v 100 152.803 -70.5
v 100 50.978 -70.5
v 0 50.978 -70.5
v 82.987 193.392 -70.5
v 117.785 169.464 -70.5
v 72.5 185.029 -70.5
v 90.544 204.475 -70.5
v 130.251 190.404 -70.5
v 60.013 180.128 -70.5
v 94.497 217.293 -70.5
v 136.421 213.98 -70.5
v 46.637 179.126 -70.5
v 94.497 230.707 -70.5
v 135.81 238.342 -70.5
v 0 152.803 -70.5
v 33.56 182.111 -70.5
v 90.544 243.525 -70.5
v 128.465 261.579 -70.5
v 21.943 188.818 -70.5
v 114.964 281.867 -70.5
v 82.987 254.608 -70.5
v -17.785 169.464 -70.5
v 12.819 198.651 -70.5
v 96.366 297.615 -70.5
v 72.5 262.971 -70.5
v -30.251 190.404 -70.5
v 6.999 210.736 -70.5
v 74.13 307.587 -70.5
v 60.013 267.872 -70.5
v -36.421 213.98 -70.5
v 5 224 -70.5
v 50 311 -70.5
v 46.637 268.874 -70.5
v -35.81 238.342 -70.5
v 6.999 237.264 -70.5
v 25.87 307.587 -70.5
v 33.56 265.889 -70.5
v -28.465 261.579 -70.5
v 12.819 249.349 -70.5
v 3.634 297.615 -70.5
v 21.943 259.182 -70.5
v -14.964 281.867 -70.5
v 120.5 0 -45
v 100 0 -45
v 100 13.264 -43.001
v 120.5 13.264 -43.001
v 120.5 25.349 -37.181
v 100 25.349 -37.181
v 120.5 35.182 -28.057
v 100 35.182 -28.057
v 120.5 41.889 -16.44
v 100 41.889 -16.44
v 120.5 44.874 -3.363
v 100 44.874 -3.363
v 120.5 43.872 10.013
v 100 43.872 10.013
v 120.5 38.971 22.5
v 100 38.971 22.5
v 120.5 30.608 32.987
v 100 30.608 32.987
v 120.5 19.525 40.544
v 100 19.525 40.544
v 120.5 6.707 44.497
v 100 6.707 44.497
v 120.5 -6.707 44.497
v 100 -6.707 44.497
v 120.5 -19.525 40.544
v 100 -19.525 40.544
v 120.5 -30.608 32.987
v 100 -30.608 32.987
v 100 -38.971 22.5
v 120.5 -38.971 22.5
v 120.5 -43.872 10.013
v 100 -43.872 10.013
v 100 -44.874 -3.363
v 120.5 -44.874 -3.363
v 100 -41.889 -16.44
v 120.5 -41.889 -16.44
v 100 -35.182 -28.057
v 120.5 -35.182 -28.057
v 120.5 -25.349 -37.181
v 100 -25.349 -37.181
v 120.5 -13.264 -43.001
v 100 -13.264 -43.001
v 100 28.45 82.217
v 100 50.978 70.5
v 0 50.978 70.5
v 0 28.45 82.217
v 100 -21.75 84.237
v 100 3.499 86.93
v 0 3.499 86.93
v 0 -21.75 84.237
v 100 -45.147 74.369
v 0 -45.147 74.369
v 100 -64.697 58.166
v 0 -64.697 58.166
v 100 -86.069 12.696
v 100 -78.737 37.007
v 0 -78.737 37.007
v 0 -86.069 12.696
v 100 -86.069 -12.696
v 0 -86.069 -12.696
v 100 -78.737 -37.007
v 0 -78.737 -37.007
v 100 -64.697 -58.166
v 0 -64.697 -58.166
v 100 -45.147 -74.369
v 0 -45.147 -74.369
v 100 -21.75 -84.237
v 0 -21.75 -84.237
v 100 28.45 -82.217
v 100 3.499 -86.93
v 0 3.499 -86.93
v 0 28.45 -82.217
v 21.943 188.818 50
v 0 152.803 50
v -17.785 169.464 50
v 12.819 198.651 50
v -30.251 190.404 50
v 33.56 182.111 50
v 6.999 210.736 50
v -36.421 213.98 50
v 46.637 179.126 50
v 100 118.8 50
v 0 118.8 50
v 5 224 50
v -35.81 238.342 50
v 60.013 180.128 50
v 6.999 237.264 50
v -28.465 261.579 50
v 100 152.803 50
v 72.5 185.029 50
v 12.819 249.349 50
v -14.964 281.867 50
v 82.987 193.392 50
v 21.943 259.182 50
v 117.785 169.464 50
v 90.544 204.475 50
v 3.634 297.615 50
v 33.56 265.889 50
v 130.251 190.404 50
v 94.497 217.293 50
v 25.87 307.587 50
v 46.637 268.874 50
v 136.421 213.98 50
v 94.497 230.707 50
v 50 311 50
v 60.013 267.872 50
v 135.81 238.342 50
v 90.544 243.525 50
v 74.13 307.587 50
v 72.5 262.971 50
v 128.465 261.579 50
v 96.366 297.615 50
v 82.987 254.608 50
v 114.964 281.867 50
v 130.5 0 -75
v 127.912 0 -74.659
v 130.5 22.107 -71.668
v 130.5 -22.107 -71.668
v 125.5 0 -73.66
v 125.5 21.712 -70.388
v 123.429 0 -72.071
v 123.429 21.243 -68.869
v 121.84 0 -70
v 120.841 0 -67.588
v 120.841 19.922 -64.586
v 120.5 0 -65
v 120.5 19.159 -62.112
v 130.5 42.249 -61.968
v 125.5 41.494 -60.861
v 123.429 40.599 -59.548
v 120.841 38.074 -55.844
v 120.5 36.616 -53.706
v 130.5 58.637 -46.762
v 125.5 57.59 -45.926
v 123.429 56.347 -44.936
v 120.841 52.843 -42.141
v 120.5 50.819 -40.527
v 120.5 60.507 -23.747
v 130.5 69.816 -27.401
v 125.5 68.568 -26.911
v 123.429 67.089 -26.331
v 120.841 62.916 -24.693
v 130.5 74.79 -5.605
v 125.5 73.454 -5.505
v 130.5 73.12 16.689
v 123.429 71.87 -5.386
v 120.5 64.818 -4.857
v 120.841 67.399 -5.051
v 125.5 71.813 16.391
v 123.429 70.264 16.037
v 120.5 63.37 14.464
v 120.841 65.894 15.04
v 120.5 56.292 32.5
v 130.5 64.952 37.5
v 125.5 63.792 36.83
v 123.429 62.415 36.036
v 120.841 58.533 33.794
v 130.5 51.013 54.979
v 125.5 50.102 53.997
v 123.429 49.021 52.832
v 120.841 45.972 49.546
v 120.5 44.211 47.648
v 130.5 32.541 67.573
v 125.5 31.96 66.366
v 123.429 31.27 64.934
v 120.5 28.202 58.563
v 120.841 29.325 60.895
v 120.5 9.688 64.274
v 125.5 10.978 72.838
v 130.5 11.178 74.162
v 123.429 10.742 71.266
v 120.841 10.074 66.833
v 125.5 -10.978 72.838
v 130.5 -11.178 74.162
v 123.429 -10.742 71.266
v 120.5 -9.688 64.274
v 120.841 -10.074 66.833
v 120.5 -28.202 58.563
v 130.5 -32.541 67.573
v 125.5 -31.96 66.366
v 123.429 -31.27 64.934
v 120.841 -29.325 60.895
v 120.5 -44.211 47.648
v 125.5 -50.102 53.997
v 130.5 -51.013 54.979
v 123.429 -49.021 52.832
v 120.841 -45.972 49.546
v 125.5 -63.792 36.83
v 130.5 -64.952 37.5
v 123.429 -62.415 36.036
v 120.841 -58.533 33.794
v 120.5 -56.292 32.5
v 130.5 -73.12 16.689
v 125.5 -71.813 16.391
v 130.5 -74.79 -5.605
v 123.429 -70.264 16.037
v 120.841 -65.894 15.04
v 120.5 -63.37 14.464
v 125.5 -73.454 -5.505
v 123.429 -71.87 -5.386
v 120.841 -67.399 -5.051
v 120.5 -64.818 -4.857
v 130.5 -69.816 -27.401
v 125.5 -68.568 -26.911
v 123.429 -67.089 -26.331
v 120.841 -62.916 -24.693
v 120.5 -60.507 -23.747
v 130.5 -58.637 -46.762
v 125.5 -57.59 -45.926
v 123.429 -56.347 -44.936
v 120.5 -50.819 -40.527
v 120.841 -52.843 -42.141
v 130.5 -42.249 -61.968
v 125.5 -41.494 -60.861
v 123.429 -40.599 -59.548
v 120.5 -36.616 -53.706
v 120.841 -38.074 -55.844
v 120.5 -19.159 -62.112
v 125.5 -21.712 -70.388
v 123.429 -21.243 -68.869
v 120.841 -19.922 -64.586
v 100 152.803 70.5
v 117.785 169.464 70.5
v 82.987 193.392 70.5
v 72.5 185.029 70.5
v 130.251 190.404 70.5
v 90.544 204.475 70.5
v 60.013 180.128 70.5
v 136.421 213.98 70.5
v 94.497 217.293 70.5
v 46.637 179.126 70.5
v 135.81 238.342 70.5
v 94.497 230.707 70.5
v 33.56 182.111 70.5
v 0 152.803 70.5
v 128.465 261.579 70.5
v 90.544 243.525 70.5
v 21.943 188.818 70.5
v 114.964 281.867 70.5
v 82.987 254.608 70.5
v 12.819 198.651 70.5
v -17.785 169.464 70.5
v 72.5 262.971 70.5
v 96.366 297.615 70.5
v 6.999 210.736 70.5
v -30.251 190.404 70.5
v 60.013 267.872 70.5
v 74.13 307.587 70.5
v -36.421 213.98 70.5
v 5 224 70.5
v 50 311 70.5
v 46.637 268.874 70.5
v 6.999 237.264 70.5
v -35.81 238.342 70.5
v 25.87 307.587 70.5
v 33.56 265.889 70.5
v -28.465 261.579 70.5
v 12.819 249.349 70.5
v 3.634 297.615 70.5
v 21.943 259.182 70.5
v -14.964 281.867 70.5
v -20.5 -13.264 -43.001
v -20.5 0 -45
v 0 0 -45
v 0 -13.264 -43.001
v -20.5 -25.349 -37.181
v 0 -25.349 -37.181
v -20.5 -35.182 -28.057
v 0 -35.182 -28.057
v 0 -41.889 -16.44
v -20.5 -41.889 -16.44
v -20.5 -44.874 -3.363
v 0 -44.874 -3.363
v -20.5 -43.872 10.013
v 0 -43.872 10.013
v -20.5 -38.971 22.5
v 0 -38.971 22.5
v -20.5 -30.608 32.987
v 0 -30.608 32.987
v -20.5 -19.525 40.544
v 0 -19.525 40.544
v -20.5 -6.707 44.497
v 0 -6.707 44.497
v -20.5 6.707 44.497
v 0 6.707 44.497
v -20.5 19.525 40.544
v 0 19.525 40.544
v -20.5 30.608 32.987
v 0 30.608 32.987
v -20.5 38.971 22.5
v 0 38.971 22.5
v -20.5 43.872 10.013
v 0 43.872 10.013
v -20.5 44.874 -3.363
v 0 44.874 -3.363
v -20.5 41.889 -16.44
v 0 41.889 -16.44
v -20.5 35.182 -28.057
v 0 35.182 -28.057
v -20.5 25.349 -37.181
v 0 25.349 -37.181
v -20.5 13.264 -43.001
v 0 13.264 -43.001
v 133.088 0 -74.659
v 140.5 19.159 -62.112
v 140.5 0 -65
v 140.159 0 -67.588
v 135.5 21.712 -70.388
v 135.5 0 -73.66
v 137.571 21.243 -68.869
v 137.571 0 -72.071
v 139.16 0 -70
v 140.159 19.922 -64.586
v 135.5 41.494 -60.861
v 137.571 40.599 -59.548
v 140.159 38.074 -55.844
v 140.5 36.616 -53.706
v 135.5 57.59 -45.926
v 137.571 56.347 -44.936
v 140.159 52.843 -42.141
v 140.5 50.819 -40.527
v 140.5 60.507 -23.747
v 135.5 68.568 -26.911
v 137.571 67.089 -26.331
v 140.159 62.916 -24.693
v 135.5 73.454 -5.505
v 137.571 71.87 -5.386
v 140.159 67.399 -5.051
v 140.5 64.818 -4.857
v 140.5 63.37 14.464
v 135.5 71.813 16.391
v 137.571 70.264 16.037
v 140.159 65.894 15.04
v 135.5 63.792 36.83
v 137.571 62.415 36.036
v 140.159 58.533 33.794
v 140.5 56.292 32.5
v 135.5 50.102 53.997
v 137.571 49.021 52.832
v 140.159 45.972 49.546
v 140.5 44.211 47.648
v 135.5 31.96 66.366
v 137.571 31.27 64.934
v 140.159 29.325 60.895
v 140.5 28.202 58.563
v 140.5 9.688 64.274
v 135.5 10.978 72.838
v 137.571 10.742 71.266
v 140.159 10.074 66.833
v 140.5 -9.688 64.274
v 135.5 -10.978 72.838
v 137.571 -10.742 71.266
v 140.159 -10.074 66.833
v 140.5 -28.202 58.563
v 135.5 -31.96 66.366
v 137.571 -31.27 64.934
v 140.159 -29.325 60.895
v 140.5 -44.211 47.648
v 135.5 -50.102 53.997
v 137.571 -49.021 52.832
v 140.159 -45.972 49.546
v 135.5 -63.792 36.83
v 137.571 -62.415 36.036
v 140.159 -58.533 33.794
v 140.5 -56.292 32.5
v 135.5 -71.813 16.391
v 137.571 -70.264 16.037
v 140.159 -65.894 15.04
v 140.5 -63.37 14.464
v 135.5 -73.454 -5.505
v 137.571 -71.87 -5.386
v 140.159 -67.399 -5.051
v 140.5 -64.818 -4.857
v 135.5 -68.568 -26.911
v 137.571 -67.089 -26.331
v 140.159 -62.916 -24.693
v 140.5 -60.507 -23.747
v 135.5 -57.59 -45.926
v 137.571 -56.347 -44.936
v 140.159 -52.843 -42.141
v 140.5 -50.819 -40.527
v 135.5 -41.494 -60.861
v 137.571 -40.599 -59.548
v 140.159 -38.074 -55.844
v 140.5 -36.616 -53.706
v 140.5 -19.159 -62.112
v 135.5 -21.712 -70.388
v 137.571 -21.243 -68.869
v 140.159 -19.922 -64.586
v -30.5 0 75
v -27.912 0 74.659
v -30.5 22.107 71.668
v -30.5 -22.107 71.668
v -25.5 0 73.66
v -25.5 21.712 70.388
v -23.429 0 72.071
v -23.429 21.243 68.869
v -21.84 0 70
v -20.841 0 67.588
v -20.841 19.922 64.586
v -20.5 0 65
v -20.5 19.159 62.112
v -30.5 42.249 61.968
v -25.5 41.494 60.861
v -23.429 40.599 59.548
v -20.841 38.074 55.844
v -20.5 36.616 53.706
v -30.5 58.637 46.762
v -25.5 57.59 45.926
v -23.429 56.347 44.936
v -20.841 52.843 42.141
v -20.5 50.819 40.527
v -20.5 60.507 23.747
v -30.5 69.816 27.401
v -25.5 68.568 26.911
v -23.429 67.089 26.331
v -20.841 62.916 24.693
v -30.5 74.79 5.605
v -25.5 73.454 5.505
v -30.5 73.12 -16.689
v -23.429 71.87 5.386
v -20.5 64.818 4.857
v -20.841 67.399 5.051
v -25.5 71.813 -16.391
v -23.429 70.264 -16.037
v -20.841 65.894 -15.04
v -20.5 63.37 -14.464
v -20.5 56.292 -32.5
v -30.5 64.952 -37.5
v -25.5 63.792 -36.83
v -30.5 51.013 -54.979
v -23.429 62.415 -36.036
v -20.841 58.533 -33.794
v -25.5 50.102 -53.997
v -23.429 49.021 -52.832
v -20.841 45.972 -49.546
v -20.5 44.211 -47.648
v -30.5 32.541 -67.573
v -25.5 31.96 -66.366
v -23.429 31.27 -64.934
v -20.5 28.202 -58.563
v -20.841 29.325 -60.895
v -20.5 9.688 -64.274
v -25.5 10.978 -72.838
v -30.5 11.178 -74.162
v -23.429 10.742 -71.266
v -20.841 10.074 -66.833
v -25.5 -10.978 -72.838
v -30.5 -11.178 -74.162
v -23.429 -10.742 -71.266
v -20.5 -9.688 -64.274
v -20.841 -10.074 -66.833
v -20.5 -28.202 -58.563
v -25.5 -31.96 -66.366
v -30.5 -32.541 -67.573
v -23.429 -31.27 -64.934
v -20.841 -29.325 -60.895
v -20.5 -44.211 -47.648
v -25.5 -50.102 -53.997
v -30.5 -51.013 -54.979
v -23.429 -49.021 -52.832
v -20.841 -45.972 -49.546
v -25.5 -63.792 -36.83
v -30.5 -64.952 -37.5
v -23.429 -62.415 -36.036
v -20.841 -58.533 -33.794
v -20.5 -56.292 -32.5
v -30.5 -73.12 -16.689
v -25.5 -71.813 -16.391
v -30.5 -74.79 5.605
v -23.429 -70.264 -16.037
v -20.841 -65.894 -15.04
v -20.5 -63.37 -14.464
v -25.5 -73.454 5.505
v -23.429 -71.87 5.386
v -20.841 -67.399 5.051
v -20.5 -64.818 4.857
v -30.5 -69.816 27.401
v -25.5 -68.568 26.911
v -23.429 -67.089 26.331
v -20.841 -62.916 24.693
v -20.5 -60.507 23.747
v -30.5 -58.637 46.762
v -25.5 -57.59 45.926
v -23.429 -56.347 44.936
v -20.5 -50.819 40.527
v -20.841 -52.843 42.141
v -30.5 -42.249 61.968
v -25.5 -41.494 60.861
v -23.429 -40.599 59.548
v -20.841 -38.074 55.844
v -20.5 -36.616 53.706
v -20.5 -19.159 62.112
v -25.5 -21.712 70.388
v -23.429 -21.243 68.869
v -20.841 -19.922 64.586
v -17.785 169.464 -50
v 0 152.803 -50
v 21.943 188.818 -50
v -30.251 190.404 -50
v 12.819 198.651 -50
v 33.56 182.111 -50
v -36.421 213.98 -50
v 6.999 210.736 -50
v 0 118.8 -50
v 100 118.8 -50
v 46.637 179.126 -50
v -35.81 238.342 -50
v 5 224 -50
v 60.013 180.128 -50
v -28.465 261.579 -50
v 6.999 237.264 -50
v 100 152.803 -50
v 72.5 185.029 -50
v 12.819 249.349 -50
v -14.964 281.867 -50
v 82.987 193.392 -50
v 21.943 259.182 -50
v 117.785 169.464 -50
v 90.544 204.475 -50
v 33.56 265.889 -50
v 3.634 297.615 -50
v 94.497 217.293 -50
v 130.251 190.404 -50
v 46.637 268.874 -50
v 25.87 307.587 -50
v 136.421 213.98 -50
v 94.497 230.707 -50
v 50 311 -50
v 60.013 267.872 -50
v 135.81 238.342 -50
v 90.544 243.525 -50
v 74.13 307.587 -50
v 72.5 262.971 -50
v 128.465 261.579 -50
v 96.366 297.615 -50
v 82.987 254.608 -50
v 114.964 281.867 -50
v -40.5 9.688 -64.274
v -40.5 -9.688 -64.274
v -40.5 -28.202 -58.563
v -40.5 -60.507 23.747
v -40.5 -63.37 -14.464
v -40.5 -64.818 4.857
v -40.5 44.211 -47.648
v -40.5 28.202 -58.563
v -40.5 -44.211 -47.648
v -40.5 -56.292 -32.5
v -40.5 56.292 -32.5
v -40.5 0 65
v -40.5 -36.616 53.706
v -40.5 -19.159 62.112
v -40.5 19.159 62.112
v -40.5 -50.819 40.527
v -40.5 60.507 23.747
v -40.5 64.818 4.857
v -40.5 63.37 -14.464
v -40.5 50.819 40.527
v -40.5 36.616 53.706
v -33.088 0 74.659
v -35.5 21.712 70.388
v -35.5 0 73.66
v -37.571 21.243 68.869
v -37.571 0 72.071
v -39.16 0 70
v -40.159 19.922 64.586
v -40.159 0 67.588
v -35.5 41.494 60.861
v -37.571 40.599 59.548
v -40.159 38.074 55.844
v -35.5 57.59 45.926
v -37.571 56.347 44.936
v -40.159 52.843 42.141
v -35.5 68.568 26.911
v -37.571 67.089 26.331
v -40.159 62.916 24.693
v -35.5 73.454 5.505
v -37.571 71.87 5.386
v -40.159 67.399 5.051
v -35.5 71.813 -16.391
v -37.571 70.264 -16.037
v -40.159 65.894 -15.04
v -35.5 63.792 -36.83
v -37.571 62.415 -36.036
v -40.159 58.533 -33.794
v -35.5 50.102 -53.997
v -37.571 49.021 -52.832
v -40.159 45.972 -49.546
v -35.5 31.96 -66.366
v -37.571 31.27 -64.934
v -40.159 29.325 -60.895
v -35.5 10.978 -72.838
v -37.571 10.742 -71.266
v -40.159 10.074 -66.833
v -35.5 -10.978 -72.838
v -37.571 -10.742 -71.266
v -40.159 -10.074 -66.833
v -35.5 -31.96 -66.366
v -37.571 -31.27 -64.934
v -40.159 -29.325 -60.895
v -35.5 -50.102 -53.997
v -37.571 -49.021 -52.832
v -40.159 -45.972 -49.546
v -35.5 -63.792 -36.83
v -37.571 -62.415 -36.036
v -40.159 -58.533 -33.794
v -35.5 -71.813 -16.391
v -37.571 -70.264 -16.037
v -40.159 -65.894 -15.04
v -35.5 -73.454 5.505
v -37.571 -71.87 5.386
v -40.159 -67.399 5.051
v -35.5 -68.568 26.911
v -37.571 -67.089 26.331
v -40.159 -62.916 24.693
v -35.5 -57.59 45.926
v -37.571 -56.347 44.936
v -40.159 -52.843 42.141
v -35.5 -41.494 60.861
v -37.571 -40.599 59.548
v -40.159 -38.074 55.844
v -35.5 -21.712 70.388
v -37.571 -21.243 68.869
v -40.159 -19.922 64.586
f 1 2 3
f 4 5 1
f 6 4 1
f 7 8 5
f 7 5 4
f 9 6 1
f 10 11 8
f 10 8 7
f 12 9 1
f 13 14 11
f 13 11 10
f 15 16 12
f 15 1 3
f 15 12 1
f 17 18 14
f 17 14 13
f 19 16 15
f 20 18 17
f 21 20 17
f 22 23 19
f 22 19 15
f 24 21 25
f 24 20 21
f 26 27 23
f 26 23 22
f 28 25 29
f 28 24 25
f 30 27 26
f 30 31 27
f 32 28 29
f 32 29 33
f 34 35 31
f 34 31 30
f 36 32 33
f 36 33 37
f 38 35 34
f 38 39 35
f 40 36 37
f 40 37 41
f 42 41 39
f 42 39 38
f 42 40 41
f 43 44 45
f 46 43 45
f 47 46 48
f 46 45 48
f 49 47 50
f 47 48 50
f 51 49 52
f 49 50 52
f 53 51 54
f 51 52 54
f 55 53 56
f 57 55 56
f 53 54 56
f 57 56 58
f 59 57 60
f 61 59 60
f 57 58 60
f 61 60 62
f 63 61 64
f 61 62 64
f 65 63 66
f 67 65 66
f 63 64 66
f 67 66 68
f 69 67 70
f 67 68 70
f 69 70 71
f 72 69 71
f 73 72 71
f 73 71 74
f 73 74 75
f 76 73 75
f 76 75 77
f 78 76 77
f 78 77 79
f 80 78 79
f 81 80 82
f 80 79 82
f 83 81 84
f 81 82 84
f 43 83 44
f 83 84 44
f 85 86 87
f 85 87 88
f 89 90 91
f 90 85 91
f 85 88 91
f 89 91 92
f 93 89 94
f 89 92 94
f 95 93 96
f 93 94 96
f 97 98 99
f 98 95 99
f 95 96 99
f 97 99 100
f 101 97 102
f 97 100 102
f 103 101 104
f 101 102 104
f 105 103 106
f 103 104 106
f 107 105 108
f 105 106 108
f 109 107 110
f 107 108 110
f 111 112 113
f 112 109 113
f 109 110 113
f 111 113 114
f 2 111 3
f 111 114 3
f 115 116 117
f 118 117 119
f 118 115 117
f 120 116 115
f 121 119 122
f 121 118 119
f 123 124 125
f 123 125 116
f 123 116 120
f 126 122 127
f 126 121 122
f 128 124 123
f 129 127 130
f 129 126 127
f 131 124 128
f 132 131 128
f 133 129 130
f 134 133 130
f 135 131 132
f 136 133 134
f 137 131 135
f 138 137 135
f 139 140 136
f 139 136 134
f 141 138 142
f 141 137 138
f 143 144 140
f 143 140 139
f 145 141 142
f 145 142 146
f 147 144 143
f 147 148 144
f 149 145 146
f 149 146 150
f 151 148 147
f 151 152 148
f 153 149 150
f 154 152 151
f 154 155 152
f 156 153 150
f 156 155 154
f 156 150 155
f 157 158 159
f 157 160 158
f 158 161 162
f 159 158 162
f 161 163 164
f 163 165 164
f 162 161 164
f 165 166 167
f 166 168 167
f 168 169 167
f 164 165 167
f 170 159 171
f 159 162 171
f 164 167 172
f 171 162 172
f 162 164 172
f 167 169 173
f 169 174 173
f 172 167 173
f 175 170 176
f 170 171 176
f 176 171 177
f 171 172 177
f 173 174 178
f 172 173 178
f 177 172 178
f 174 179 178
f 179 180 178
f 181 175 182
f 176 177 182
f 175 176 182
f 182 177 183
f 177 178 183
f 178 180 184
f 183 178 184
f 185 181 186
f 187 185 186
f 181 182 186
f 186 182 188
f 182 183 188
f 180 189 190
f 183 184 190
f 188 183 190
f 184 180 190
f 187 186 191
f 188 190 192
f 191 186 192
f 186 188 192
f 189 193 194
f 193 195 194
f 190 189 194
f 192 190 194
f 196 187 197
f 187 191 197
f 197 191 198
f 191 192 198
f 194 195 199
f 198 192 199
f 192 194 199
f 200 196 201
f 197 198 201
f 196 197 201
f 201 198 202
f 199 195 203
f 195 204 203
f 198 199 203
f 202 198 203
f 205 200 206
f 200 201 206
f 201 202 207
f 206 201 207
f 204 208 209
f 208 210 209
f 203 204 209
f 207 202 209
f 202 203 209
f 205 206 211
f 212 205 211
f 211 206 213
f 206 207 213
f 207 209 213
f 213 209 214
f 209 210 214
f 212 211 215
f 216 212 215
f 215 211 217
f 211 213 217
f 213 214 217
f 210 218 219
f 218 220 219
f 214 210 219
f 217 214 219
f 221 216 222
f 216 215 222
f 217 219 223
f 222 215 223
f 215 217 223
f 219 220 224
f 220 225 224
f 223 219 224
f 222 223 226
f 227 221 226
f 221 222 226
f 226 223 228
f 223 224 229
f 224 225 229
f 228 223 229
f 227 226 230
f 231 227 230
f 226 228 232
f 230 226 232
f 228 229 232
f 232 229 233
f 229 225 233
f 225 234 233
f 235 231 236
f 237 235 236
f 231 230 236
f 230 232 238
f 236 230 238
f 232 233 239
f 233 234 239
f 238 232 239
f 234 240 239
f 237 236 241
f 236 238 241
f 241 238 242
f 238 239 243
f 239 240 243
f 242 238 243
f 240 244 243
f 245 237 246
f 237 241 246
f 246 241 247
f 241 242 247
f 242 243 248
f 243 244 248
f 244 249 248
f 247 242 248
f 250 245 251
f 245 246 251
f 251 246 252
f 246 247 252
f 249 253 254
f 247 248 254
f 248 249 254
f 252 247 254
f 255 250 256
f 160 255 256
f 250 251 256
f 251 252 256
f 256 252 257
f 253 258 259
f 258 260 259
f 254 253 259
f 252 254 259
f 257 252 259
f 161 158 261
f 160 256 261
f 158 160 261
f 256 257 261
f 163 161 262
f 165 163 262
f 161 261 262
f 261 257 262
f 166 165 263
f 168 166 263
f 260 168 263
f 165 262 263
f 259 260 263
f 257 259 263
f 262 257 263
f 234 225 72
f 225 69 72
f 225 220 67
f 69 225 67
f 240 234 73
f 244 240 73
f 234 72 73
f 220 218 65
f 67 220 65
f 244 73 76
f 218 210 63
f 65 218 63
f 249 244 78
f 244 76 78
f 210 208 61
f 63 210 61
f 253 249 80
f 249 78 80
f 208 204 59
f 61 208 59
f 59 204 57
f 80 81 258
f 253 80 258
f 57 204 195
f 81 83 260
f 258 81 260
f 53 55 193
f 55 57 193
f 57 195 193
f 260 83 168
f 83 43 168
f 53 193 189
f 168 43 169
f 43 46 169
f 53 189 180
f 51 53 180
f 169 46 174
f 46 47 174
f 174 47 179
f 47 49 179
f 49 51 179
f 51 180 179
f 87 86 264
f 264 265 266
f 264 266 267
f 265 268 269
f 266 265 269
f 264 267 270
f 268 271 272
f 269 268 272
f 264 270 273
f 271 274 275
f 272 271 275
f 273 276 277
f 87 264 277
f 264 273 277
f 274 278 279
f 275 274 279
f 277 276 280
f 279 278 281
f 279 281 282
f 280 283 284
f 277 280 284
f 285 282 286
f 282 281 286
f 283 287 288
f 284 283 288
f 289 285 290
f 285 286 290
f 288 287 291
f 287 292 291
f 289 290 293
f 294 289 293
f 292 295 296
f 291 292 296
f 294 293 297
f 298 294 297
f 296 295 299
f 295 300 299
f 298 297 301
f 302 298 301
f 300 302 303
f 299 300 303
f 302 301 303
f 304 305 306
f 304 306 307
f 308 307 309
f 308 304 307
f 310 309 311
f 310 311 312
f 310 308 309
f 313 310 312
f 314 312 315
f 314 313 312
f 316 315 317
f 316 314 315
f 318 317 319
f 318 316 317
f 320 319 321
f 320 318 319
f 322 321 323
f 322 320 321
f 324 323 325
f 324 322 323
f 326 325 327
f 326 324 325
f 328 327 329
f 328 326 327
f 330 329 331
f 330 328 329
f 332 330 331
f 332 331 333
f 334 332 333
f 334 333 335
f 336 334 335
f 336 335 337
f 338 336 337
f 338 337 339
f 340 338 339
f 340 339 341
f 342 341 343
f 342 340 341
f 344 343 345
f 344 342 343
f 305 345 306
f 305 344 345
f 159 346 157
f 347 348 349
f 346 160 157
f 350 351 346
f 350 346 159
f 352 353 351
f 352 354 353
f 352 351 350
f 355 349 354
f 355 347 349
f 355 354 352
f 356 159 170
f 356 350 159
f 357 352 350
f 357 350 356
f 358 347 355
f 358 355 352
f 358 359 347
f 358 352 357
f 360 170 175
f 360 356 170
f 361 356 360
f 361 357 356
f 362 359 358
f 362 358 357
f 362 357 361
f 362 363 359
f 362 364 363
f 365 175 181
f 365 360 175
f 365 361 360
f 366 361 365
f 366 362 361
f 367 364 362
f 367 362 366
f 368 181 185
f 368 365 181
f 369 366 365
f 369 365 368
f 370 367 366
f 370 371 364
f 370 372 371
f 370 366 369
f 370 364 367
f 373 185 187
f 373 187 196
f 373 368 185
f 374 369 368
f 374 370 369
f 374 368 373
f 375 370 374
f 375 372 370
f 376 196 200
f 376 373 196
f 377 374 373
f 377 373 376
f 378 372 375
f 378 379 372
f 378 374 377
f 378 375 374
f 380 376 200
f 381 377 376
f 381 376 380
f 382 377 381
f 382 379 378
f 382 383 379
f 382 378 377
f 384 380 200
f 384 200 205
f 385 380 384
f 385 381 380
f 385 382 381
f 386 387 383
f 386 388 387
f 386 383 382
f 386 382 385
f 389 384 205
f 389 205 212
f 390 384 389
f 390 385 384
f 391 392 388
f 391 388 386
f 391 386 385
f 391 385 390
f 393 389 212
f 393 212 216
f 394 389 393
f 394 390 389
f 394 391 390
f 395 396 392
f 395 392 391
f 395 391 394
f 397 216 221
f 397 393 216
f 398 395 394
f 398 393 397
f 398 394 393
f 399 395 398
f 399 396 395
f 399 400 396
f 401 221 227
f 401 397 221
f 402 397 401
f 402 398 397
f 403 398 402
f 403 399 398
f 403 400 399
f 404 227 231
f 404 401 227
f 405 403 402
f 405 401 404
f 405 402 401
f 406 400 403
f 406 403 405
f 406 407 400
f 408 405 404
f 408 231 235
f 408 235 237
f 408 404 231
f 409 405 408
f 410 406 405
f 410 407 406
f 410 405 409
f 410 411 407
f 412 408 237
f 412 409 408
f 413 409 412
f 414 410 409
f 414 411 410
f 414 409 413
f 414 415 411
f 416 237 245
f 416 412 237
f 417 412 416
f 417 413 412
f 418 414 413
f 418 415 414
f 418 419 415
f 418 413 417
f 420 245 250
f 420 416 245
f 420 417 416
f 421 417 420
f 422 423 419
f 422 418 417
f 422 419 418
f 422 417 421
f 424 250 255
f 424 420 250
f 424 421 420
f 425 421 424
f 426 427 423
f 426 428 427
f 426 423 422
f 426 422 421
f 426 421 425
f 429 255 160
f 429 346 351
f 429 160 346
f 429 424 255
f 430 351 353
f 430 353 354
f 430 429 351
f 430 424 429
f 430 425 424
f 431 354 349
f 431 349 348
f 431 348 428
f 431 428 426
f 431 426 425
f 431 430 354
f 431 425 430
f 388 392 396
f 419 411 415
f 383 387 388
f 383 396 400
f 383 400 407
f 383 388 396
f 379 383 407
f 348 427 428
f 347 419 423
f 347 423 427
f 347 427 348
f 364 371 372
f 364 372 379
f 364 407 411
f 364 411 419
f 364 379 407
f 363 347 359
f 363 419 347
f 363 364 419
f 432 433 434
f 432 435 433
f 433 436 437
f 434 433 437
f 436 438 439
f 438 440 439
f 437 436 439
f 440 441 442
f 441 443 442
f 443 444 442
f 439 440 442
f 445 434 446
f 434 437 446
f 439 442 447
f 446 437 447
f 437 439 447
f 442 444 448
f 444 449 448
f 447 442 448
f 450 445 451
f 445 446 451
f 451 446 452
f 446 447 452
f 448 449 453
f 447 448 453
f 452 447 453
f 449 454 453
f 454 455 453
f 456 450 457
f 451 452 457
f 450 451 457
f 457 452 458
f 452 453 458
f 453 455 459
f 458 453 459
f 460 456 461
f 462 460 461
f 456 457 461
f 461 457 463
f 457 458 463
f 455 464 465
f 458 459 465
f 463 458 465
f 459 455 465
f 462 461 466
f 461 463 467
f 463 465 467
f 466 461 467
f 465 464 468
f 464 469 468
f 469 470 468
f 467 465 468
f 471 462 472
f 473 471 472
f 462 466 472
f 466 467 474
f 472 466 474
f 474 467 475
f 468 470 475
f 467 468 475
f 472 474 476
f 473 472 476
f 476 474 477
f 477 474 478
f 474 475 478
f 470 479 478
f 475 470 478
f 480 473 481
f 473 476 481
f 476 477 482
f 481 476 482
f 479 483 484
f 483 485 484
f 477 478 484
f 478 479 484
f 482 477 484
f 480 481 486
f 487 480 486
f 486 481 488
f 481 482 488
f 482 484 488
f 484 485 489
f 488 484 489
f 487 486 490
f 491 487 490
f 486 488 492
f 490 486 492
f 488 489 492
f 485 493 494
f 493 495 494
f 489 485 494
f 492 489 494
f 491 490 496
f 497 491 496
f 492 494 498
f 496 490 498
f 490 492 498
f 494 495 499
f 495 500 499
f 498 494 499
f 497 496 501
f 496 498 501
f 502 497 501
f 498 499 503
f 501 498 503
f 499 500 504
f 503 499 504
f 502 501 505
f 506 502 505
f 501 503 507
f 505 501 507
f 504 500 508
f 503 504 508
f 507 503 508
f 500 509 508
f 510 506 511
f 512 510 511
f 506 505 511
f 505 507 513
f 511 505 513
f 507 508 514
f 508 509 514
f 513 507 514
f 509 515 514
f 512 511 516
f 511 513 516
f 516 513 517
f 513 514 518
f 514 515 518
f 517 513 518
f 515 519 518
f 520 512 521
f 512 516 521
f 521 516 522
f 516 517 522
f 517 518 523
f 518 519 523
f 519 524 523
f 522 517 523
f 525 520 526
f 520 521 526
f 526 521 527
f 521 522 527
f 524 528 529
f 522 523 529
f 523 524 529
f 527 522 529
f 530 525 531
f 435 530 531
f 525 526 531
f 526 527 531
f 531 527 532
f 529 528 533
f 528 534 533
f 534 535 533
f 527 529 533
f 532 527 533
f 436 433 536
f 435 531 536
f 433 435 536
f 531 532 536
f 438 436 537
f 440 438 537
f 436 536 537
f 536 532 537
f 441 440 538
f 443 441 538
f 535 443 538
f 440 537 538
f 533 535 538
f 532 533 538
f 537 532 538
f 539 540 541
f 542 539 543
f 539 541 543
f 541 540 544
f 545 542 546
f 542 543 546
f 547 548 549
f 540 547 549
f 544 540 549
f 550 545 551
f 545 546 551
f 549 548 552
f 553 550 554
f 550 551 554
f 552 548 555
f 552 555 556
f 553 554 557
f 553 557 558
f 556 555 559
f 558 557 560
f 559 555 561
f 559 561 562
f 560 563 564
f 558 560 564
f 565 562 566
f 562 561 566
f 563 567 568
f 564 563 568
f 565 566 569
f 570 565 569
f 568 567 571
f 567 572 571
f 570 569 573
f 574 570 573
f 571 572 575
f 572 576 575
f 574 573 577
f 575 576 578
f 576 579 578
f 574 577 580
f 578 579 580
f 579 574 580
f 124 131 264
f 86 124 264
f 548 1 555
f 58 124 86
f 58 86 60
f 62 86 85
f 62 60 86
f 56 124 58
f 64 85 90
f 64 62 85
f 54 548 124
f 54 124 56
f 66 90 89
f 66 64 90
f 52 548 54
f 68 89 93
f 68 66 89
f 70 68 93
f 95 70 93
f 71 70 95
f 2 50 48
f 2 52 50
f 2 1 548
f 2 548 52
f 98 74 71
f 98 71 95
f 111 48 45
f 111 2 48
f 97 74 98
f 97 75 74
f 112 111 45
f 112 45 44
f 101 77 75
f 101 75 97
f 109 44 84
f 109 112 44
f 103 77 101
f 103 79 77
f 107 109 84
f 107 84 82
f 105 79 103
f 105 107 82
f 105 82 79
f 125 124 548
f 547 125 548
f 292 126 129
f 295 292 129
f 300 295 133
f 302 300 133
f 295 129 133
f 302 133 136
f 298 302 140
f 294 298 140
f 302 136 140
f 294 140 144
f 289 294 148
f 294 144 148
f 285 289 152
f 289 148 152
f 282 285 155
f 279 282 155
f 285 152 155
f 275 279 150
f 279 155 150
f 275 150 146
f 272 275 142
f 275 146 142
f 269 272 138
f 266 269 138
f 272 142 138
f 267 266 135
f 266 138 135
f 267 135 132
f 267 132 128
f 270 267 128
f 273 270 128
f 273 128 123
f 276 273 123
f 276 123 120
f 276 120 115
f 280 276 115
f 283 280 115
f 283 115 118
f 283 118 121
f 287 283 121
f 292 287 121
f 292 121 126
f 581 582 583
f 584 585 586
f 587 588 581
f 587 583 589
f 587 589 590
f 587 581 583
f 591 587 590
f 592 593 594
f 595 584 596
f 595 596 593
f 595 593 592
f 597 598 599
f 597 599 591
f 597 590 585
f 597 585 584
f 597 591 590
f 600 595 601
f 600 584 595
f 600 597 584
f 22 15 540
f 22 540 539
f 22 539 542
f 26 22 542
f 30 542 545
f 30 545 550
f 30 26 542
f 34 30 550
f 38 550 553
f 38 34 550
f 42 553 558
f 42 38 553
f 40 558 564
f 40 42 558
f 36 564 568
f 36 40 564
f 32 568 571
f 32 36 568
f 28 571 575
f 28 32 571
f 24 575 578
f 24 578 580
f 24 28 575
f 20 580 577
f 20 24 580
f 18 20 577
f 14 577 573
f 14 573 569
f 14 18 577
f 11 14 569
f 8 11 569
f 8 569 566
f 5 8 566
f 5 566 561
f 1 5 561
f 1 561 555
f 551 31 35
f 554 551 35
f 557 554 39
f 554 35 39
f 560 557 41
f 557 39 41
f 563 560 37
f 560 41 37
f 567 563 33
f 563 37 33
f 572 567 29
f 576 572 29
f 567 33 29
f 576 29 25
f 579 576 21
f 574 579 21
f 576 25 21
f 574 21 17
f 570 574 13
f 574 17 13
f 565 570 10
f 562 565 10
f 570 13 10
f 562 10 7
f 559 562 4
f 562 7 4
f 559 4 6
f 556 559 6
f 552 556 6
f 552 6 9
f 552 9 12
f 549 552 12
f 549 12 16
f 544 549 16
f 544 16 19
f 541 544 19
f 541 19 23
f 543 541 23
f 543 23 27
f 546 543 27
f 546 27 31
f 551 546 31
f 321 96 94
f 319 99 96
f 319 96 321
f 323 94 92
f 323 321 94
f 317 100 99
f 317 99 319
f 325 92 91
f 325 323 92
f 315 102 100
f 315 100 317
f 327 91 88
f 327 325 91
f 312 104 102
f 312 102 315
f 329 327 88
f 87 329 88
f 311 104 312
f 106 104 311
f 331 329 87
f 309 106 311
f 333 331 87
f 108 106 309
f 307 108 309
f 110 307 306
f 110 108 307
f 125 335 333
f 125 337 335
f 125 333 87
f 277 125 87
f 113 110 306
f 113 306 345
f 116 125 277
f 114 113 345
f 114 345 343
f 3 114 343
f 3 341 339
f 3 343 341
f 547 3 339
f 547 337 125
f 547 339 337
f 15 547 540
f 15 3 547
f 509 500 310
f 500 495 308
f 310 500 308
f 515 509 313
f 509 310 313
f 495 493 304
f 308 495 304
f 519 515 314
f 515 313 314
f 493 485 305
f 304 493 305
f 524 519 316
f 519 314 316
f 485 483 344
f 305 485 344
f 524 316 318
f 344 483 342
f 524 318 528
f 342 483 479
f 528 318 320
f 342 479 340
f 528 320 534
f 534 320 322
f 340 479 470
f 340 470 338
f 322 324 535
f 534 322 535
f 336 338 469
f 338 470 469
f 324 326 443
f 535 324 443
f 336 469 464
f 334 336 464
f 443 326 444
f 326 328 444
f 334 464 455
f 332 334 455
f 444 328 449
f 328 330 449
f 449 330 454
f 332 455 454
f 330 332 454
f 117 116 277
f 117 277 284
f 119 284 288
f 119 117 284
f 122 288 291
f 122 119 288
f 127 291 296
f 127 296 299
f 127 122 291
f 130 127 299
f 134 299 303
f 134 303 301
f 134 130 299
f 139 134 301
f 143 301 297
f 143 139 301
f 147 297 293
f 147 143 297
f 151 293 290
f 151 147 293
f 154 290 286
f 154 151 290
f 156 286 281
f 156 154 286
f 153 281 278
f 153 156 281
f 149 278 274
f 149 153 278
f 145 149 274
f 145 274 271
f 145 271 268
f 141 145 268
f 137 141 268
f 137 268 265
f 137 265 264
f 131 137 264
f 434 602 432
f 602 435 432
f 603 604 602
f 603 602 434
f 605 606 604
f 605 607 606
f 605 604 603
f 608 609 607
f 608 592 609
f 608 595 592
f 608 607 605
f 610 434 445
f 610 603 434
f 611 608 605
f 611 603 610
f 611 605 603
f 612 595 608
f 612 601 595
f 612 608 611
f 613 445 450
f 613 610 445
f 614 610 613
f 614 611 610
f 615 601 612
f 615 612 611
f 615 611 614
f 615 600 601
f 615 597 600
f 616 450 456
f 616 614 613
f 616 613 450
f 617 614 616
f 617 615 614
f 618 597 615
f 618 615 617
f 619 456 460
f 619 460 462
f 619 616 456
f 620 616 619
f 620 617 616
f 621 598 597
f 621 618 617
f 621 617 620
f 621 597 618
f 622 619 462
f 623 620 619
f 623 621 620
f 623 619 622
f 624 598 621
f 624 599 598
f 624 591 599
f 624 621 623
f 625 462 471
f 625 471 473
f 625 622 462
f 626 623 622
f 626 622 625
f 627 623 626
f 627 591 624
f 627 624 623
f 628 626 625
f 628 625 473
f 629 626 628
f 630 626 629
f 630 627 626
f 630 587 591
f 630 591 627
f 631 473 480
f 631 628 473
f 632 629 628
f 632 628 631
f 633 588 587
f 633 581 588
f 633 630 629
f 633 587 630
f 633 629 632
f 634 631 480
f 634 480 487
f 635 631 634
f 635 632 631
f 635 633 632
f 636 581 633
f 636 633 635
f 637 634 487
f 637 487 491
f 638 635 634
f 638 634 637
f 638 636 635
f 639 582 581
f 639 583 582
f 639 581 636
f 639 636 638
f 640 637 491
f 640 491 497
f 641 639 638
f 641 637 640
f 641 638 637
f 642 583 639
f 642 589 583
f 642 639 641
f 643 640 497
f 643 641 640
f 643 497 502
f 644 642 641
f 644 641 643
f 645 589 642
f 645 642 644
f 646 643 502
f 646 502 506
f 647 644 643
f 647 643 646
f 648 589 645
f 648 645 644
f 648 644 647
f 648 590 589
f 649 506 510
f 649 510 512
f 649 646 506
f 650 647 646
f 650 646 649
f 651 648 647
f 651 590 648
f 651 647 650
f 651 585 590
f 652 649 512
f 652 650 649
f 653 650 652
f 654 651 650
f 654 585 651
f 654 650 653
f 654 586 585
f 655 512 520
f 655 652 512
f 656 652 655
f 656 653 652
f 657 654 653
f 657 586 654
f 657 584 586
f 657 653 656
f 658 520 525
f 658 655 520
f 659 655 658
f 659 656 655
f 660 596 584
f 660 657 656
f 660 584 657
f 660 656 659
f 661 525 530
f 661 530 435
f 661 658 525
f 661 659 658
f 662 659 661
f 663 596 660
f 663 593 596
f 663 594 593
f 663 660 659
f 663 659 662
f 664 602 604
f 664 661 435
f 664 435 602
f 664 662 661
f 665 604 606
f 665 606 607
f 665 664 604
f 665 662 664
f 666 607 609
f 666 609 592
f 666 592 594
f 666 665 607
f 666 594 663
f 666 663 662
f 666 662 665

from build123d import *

# Parameters (mm, degrees)
SKETCH1_R                = 87
BOSS_EXTRUDE3_DEPTH      = 100
SKETCH2_R                = 45
BOSS_EXTRUDE4_DEPTH      = 20.5
SKETCH3_R                = 75
BOSS_EXTRUDE5_DEPTH      = 20
FILLET1_R                = 10
BOSS_EXTRUDE6_START      = 20.5
SKETCH4_R                = 45
BOSS_EXTRUDE6_DEPTH      = 20.5
BOSS_EXTRUDE7_START      = 20
SKETCH5_R                = 75
BOSS_EXTRUDE7_DEPTH      = 20
FILLET2_R                = 10
BOSS_EXTRUDE8_REACH      = 241.969
BOSS_EXTRUDE8_END_RADIUS = 87
SKETCH6_W                = 100
SKETCH6_H                = 141
SKETCH9_R                = 45
BOSS_EXTRUDE10_DEPTH     = 141
CUT_EXTRUDE2_DEPTH       = 374.425025993
CUT_EXTRUDE2_DEPTH_BACK  = 374.425025993
SKETCH21_W               = 216.769628827
SKETCH21_H               = 100


with BuildPart() as part:
    # Sketch1 → Boss-Extrude3 (new body)
    with BuildSketch(Plane(origin=(0, 0, 0), x_dir=(0, 0, -1), z_dir=(1, 0, 0))):
        Circle(SKETCH1_R)
    extrude(amount=BOSS_EXTRUDE3_DEPTH)

    # Sketch2 → Boss-Extrude4 (add)
    with BuildSketch(Plane(origin=(100, 0, 0), x_dir=(0, 0, -1), z_dir=(1, 0, 0))):
        Circle(SKETCH2_R)
    extrude(amount=BOSS_EXTRUDE4_DEPTH)

    # Sketch3 → Boss-Extrude5 (add)
    with BuildSketch(Plane(origin=(120.5, 0, 0), x_dir=(0, 0, -1), z_dir=(1, 0, 0))):
        Circle(SKETCH3_R)
    extrude(amount=BOSS_EXTRUDE5_DEPTH)

    # Fillet1
    fillet1_edges = [part.edges().sort_by_distance(p)[0] for p in [
        (140.5, 0, 75),
        (120.5, 0, 75),
    ]]
    fillet(fillet1_edges, radius=FILLET1_R - 0.0001)  # a hair under: the kernel refuses the full size

    # Sketch4 → Boss-Extrude6 (add)
    with BuildSketch(Plane.ZY.offset(BOSS_EXTRUDE6_START)):
        with Locations(Location((0, 0, 0), (0, 0, 180))):
            Circle(SKETCH4_R)
    extrude(amount=-BOSS_EXTRUDE6_DEPTH)

    # Sketch5 → Boss-Extrude7 (add)
    with BuildSketch(Plane.ZY.offset(20.5).offset(BOSS_EXTRUDE7_START)):
        Circle(SKETCH5_R)
    extrude(amount=-BOSS_EXTRUDE7_DEPTH)

    # Fillet2
    fillet2_edges = [part.edges().sort_by_distance(p)[0] for p in [
        (-20.5, 0, -75),
        (-40.5, 0, -75),
    ]]
    fillet(fillet2_edges, radius=FILLET2_R - 0.0001)  # a hair under: the kernel refuses the full size

    # Boss-Extrude8: up to this cylinder (the profile starts outside it)
    boss_extrude8_end = Plane(origin=(50, 0, 0), z_dir=(-1, 0, 0)) * Cylinder(BOSS_EXTRUDE8_END_RADIUS, 658.938, mode=Mode.PRIVATE)
    # Sketch6 → Boss-Extrude8 (add, up to the surface)
    with BuildSketch(Plane(origin=(0, 87, 0), x_dir=(1, 0, 0), z_dir=(0, 1, 0)), mode=Mode.PRIVATE) as boss_extrude8_sk1:
        with Locations((50, 0)):
            Rectangle(SKETCH6_W, SKETCH6_H)
    boss_extrude8_tool1 = extrude(boss_extrude8_sk1.sketch, amount=-BOSS_EXTRUDE8_REACH, mode=Mode.PRIVATE) - boss_extrude8_end
    add(boss_extrude8_tool1.solids().sort_by_distance((50, 87, 0))[0])
    add(boss_extrude8_tool1.solids().sort_by_distance((50, 87, 0))[1])

    # Sketch9 → Boss-Extrude10 (add)
    with BuildSketch(Plane(origin=(0, 0, -70.5), x_dir=(-1, 0, 0), z_dir=(0, 0, -1))):
        with BuildLine():
            Line((-100, 87), (0, 87))
            Line((0, 87), (0, 152.803089955))
            ThreePointArc((0, 152.803089955), (-50, 311), (-100, 152.803089955))
            Line((-100, 152.803089955), (-100, 87))
        make_face()
        with Locations((-50, 224)):
            Circle(SKETCH9_R, mode=Mode.SUBTRACT)
    extrude(amount=-BOSS_EXTRUDE10_DEPTH)

    # Sketch21 → Cut-Extrude2 (cut, two sides: drawn at the far end of the back side and taken through both)
    with BuildSketch(Plane(origin=(147, 0, 0), x_dir=(0, 1, 0), z_dir=(-1, 0, 0)).offset(-CUT_EXTRUDE2_DEPTH_BACK)):
        with Locations((227.184814414, 0)):
            Rectangle(SKETCH21_W, SKETCH21_H)
    extrude(amount=CUT_EXTRUDE2_DEPTH + CUT_EXTRUDE2_DEPTH_BACK, mode=Mode.SUBTRACT)


solid = part.part
